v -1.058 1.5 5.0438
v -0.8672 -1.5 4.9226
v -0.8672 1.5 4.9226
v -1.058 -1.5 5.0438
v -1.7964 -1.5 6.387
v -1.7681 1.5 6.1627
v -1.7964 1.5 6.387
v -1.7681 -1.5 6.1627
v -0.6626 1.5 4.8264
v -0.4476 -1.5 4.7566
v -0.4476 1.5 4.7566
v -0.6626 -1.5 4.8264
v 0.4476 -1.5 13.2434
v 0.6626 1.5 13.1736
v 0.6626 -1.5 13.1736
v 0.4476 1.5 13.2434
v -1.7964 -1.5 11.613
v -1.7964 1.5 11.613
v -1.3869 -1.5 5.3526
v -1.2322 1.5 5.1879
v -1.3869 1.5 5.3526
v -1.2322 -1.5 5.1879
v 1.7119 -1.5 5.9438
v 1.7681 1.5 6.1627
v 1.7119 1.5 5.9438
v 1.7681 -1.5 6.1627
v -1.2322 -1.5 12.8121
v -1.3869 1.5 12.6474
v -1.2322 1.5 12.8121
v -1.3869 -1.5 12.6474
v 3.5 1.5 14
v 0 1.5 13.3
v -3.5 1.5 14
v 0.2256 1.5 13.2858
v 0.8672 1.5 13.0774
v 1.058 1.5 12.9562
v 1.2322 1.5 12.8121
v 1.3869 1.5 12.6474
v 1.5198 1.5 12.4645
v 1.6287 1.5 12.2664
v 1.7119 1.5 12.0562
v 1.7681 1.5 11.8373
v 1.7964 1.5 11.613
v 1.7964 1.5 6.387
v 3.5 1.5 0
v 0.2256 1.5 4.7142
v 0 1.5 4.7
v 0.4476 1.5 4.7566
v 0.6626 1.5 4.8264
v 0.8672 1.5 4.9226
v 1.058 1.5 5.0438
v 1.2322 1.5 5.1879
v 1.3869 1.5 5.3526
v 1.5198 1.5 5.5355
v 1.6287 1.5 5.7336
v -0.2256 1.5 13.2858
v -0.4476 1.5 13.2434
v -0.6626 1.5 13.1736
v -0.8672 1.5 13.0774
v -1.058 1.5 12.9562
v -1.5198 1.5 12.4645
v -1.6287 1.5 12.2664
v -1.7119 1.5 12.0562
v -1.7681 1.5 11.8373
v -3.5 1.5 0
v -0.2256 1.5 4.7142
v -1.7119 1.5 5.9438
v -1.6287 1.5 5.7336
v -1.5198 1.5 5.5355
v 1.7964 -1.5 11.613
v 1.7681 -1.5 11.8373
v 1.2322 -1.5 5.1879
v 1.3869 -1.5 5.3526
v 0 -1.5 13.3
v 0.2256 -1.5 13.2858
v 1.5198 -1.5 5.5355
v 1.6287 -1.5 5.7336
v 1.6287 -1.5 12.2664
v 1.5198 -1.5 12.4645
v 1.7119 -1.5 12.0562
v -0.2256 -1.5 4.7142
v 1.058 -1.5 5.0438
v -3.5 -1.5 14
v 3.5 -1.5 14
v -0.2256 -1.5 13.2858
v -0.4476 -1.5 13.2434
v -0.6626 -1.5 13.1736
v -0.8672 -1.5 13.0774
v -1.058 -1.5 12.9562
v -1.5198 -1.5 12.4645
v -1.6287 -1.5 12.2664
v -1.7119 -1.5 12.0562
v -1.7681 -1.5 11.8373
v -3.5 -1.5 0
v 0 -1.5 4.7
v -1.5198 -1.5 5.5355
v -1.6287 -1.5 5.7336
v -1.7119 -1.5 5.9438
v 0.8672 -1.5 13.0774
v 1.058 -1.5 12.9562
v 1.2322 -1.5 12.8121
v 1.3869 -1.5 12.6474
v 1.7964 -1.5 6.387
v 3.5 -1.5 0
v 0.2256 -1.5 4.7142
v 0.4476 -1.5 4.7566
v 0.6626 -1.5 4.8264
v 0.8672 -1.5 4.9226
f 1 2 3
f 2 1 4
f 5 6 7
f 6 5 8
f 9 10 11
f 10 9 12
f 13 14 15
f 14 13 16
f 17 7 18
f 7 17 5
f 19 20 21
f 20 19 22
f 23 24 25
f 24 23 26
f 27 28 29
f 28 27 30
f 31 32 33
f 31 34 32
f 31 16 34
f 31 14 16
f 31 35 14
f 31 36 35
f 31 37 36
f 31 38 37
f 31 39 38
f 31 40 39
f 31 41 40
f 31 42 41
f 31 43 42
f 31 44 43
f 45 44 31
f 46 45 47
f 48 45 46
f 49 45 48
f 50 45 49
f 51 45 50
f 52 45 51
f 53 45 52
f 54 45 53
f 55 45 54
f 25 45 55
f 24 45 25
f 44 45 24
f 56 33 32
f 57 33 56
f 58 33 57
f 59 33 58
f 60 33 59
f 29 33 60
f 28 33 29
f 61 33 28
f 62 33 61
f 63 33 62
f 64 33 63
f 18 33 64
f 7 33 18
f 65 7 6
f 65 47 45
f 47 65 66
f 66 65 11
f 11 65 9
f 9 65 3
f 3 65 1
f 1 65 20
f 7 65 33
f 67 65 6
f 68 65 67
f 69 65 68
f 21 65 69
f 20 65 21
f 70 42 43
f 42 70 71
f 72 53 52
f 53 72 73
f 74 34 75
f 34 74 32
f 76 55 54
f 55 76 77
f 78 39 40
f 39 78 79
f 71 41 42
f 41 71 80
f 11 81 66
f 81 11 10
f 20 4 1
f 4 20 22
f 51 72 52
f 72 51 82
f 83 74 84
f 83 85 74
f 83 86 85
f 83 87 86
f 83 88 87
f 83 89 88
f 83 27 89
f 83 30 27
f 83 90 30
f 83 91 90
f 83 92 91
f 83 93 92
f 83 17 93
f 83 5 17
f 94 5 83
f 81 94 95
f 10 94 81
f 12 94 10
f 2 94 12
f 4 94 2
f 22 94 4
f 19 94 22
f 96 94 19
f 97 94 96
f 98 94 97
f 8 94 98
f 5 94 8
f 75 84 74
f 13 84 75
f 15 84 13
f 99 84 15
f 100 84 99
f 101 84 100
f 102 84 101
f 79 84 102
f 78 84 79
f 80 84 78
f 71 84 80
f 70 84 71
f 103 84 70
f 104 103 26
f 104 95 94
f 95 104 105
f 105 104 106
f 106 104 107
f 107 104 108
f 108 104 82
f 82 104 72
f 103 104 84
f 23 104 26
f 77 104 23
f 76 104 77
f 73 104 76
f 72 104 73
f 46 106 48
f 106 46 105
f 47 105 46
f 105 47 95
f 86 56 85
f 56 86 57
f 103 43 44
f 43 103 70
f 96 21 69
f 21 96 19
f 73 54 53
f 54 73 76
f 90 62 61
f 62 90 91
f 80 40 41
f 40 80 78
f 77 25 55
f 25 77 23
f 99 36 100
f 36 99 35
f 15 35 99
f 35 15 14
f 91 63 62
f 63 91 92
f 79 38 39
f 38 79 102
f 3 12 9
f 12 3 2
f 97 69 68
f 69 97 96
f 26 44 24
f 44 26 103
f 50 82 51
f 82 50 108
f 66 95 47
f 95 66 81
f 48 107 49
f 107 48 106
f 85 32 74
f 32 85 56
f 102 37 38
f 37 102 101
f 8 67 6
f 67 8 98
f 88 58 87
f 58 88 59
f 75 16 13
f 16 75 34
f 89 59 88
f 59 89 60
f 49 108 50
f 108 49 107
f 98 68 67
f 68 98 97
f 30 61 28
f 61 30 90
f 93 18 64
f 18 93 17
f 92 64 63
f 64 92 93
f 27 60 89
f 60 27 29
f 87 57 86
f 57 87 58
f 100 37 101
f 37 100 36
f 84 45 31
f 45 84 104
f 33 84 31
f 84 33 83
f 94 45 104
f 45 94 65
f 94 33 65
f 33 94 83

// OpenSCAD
$fn = 50;


difference() {
	union() {
		translate(v = [-3.5000000000, -1.5000000000, 0]) {
			cube(size = [7, 3, 14]);
		}
	}
	union() {
		translate(v = [0, -1.5000000000, 9.0000000000]) {
			rotate(a = [0, 90, 90]) {
				difference() {
					union() {
						#hull() {
							#translate(v = [2.5000000000, 0, 0]) {
								cylinder(h = 3, r = 1.8000000000, r1 = 1.8000000000, r2 = 1.8000000000);
							}
							#translate(v = [-2.5000000000, 0, 0]) {
								cylinder(h = 3, r = 1.8000000000, r1 = 1.8000000000, r2 = 1.8000000000);
							}
						}
					}
					union();
				}
			}
		}
	}
}
